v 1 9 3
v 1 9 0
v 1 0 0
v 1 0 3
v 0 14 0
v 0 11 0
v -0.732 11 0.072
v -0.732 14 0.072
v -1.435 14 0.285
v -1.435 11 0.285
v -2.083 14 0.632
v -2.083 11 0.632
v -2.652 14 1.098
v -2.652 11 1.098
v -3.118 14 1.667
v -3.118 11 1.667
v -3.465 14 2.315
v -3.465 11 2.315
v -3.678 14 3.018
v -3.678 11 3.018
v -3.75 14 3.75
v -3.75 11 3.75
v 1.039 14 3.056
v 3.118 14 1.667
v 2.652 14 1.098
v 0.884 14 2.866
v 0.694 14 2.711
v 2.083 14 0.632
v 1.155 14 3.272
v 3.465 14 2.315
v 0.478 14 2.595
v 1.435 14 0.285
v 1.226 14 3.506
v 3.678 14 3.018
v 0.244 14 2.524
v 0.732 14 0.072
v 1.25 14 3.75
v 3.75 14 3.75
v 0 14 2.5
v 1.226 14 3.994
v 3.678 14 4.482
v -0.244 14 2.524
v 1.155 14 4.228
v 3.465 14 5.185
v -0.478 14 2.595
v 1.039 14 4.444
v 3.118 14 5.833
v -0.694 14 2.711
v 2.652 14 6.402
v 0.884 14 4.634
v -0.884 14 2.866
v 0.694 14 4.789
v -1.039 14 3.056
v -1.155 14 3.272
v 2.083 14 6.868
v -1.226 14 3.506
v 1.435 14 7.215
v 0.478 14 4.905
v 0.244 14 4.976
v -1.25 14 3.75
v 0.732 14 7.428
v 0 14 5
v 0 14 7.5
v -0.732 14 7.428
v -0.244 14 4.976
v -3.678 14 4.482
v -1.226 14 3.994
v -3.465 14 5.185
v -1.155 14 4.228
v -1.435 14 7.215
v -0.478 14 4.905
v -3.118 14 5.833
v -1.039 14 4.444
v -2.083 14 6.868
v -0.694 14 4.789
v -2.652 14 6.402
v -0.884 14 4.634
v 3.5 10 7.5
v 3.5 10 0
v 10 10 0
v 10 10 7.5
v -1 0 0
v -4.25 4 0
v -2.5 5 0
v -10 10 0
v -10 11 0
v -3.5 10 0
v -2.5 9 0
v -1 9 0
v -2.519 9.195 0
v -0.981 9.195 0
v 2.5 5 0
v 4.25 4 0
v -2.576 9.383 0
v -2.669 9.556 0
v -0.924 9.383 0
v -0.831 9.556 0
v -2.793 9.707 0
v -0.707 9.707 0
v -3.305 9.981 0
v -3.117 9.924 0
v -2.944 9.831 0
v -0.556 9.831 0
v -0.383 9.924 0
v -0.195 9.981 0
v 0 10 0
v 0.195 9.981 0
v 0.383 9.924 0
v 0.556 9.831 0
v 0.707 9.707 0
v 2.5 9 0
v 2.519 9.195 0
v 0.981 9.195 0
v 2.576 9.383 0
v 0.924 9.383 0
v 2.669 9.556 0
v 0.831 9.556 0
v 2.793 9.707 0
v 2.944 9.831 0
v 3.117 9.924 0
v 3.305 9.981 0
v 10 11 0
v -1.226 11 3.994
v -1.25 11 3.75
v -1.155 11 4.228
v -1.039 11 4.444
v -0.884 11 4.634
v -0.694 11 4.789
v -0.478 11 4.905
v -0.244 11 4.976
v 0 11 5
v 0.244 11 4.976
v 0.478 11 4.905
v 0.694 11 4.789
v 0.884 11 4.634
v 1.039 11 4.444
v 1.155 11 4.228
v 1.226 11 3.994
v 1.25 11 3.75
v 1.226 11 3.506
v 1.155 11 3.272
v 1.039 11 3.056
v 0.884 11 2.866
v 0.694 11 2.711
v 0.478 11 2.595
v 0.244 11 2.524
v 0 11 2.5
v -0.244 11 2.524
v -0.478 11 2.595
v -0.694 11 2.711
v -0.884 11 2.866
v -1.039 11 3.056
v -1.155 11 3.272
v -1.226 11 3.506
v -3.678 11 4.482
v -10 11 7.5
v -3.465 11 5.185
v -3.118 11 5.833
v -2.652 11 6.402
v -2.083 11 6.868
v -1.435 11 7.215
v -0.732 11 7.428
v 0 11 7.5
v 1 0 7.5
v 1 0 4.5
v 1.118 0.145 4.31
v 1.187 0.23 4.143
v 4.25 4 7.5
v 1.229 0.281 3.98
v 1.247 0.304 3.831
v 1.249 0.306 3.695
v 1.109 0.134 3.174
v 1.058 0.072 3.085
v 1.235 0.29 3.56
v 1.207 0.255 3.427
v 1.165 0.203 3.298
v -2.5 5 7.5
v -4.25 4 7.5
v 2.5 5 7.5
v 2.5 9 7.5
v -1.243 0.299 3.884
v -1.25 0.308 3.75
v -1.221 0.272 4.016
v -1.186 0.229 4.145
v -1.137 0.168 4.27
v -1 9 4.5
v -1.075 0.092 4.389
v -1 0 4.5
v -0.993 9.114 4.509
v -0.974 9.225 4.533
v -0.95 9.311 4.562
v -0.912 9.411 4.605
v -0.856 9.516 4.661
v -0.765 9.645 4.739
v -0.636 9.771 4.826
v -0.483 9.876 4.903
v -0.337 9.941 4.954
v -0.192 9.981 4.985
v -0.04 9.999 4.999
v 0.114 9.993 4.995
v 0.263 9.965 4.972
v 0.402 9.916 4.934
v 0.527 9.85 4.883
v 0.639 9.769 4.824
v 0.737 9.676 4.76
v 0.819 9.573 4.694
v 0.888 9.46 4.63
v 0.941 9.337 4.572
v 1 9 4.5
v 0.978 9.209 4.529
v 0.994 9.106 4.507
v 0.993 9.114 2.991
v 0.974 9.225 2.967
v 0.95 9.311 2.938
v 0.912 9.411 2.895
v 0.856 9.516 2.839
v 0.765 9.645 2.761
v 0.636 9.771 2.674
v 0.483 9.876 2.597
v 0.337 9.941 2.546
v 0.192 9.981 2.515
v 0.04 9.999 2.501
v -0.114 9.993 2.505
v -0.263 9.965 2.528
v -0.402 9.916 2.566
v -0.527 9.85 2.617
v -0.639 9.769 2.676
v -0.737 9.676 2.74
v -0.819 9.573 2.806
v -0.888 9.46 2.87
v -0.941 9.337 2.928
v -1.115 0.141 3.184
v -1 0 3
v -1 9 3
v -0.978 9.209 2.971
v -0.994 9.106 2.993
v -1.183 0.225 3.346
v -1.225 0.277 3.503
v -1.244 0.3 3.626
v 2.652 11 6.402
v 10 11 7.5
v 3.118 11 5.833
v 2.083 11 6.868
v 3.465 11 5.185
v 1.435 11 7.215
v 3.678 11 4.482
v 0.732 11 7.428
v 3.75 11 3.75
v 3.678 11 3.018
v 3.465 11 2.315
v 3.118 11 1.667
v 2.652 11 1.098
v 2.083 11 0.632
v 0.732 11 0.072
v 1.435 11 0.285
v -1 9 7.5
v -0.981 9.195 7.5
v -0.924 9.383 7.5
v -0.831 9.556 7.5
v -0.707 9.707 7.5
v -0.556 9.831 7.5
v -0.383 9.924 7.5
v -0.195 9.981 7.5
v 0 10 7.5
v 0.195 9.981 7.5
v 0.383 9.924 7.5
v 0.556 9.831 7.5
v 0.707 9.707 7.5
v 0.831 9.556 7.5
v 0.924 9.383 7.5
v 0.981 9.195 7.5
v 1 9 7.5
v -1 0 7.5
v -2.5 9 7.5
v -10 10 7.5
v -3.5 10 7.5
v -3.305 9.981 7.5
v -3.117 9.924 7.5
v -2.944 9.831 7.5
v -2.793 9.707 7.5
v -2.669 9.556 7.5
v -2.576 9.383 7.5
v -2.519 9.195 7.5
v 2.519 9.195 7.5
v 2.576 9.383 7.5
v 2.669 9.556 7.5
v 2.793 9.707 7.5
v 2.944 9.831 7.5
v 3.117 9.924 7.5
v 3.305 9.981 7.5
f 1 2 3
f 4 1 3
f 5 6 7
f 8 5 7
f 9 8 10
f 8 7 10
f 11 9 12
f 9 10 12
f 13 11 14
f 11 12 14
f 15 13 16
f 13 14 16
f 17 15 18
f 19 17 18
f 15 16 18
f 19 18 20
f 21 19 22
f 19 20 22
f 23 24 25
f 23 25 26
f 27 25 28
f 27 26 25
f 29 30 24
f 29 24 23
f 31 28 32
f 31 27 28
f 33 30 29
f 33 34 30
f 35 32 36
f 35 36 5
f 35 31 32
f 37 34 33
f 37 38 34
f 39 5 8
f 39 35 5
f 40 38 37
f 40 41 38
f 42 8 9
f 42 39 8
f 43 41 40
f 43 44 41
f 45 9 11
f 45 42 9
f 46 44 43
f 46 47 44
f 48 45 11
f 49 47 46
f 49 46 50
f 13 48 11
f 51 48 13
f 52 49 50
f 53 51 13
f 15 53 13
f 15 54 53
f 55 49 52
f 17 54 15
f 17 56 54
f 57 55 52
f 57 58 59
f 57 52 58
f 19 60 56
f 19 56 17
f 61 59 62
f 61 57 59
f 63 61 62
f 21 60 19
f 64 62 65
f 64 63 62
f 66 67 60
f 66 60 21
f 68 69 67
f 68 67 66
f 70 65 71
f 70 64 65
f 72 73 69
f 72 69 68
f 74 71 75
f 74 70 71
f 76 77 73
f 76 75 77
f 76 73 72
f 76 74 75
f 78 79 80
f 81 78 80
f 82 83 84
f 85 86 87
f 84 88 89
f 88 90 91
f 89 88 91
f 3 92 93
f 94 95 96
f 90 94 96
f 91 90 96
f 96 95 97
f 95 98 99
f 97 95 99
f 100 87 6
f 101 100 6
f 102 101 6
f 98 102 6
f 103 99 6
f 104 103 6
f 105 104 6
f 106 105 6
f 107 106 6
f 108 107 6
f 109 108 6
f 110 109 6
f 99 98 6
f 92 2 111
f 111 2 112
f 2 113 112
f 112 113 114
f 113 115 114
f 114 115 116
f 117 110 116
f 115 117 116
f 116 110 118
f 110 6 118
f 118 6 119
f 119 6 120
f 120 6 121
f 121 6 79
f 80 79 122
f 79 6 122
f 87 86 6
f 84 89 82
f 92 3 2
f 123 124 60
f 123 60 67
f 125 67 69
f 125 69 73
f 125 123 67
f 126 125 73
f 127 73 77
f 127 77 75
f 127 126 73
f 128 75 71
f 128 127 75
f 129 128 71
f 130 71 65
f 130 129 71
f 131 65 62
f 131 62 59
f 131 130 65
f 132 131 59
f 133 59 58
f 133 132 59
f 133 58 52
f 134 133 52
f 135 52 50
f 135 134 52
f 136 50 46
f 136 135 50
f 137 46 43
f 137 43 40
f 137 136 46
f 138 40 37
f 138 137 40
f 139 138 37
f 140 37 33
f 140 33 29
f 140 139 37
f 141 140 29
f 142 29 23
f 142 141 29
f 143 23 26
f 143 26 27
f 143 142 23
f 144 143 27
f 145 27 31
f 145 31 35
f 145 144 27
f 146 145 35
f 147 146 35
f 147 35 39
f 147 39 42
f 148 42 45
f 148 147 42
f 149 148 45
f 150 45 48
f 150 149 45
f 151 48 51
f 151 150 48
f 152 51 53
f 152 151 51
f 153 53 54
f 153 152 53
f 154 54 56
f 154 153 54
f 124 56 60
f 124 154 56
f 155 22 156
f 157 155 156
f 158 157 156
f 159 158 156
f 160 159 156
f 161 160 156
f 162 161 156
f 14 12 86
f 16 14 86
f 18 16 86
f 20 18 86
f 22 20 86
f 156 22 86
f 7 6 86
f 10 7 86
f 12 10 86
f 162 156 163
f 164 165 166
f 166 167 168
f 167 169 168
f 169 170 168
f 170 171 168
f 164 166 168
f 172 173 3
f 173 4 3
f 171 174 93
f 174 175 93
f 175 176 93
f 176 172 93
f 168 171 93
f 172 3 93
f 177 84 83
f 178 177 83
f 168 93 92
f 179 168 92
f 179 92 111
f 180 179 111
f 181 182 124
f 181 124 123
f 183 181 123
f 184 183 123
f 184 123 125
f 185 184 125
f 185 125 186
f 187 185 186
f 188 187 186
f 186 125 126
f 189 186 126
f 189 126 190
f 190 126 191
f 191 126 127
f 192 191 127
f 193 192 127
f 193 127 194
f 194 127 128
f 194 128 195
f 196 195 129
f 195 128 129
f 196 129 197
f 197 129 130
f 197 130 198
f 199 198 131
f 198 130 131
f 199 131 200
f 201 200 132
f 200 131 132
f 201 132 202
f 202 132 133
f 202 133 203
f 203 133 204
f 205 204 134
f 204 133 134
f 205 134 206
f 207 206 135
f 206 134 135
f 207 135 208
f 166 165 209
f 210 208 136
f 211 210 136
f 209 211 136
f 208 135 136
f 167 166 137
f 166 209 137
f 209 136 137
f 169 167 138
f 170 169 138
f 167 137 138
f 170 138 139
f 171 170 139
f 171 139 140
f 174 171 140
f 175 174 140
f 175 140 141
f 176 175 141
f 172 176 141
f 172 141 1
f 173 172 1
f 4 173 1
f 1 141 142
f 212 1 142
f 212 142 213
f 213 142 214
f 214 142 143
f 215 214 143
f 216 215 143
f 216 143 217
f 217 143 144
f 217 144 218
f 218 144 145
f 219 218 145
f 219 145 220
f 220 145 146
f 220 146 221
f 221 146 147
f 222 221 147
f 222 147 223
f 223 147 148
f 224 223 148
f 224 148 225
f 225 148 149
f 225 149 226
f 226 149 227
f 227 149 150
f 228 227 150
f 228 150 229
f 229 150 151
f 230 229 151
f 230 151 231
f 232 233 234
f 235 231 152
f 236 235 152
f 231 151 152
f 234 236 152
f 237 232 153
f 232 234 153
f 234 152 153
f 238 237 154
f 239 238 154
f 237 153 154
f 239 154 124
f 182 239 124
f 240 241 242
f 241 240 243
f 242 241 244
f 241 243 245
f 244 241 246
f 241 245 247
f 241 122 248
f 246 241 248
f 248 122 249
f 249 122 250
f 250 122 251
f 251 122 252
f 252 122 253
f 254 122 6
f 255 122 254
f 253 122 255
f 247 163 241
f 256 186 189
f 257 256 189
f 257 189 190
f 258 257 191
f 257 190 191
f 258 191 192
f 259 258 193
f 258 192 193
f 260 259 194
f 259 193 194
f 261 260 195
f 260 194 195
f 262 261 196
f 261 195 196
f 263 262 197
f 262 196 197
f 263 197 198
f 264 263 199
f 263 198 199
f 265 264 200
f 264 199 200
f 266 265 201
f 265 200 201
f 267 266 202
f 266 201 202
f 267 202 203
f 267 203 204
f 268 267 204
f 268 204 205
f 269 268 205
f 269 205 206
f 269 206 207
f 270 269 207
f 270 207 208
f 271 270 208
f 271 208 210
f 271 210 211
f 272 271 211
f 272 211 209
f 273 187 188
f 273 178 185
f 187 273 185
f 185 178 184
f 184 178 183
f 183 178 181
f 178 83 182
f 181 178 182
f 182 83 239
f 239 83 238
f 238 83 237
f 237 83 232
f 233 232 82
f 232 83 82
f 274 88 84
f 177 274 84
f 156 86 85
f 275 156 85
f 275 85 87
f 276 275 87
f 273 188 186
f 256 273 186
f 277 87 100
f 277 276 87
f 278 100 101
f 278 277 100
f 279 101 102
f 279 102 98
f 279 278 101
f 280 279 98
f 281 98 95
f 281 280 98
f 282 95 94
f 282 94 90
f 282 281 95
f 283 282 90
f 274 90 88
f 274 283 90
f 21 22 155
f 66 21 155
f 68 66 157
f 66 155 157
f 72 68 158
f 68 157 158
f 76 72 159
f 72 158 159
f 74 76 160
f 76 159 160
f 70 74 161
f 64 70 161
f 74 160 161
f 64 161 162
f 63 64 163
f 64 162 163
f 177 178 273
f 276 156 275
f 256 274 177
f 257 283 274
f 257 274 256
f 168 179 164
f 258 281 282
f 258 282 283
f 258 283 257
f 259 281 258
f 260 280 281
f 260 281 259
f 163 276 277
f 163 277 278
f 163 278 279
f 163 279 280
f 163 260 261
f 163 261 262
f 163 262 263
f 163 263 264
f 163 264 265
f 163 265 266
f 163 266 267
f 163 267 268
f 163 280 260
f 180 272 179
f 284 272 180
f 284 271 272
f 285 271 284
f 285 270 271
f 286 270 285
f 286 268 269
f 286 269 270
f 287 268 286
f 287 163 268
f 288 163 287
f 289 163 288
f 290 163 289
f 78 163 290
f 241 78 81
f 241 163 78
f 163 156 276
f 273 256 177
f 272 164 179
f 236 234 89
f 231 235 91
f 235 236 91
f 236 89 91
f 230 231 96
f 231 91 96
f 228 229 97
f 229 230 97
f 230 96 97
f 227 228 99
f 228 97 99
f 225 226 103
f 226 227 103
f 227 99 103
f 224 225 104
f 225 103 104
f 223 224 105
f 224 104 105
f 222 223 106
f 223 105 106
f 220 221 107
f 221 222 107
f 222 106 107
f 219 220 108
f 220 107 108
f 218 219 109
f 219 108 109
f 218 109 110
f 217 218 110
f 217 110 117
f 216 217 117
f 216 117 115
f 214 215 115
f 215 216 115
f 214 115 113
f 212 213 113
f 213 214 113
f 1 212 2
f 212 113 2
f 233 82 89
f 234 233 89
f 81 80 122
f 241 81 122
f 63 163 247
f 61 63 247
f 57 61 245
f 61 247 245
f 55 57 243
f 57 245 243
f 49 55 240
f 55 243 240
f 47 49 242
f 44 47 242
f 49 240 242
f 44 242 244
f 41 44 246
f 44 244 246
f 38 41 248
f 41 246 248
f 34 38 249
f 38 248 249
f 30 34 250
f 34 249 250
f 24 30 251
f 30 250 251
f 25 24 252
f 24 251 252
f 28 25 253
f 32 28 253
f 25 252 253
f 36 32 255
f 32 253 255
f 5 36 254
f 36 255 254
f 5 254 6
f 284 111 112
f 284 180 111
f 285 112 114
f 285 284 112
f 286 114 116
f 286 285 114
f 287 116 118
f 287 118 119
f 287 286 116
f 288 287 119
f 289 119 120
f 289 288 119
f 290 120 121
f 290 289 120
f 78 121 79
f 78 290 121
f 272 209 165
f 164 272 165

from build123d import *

# Parameters (mm, degrees)
F1_DEPTH = 7.5
F2_R     = 1
F3_R     = 1.25
F4_DEPTH = 3
F5_DEPTH = 13


with BuildPart() as f1:
    # F0 (on Top) → F1 (new body)
    with BuildSketch(Plane.XY):
        with BuildLine():
            Line((-4.25, 4), (-1, 0))
            Line((-1, 0), (-1, 9))
            ThreePointArc((-1, 9), (0, 10), (1, 9))
            Line((1, 9), (1, 0))
            Line((1, 0), (4.25, 4))
            Line((4.25, 4), (2.5, 5))
            Line((2.5, 5), (2.5, 10))
            Line((2.5, 10), (10, 10))
            Line((10, 10), (10, 11))
            Line((10, 11), (-10, 11))
            Line((-10, 11), (-10, 10))
            Line((-10, 10), (-2.5, 10))
            Line((-2.5, 10), (-2.5, 5))
            Line((-2.5, 5), (-4.25, 4))
        make_face()
    extrude(amount=F1_DEPTH)

    # F2
    f2_edges = [f1.edges().sort_by_distance(p)[0] for p in [
        (2.5, 10, 3.75),
        (-2.5, 10, 3.75),
    ]]
    fillet(f2_edges, radius=F2_R)

    # F3 (on face) → F4 (join)
    with BuildSketch(Plane(origin=(0, 11, 0), x_dir=(-1, 0, 0), z_dir=(0, 1, 0))):
        with BuildLine():
            ThreePointArc((0, 0), (2.65165, 1.09835), (3.75, 3.75))
            ThreePointArc((3.75, 3.75), (2.65165, 6.40165), (0, 7.5))
            ThreePointArc((0, 7.5), (-3.75, 3.75), (0, 0))
        make_face()
        with Locations((0, 3.75)):
            Circle(F3_R, mode=Mode.SUBTRACT)
    extrude(amount=F4_DEPTH)

    # F3 (on face) → F5 (cut)
    with BuildSketch(Plane(origin=(0, 11, 0), x_dir=(-1, 0, 0), z_dir=(0, 1, 0))):
        with Locations((0, 3.75)):
            Circle(F3_R)
    extrude(amount=-F5_DEPTH, mode=Mode.SUBTRACT)


solid = f1.part
